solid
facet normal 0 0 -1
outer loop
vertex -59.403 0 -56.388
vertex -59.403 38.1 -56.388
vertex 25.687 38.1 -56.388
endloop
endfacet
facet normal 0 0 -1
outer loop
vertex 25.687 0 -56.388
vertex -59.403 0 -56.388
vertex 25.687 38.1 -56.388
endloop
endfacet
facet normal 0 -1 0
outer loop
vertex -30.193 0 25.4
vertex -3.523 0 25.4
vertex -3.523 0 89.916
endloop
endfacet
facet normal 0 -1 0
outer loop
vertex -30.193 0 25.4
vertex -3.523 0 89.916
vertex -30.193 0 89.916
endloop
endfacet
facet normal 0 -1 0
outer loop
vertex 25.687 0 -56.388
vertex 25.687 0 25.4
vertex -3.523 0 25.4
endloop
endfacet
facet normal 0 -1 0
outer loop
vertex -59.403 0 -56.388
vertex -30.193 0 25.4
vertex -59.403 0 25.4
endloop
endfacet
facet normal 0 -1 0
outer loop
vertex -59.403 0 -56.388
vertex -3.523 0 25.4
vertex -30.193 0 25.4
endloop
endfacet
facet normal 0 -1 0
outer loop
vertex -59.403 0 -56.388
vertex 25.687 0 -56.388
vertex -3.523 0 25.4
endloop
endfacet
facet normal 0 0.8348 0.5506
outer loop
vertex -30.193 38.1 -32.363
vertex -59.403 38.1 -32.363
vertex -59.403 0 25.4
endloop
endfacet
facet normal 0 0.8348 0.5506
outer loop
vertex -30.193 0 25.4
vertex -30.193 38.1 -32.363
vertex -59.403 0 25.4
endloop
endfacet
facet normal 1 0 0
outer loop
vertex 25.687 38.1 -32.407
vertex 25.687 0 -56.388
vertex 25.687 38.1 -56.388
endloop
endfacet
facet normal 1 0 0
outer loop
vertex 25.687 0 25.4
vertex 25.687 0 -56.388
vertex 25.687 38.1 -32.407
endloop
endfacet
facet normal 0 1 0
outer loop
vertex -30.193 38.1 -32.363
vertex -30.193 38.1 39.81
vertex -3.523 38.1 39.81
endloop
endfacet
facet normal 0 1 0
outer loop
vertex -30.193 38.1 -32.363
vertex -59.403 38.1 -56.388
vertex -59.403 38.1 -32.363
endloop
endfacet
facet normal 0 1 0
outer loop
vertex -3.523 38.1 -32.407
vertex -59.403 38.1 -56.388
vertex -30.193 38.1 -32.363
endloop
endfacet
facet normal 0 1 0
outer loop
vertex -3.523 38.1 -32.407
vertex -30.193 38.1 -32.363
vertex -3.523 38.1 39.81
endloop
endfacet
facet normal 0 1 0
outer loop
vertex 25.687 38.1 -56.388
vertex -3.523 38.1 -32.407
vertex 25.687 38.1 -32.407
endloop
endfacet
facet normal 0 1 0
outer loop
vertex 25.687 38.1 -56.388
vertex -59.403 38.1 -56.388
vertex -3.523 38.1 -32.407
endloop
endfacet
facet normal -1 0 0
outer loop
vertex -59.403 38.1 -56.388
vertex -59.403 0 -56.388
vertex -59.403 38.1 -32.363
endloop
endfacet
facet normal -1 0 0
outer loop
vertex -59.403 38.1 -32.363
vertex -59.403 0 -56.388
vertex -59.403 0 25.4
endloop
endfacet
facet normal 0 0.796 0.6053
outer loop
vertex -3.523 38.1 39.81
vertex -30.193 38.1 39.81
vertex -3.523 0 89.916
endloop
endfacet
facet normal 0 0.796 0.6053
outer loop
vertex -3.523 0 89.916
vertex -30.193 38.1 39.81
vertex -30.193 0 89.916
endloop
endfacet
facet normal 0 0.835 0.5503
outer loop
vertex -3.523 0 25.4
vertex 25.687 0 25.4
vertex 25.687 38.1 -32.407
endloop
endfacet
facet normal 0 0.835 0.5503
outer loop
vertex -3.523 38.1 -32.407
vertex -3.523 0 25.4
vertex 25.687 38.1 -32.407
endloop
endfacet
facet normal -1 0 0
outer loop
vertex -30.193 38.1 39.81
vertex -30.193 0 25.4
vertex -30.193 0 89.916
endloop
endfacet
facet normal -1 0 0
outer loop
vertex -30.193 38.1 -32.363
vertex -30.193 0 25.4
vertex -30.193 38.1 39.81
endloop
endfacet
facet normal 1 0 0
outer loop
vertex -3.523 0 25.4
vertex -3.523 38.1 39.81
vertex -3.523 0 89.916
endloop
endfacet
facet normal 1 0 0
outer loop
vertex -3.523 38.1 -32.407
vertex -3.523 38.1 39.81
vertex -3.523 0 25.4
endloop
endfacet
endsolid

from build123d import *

# Parameters (mm, degrees)
F0_W      = 44.45
F0_H      = 38.1
F1_DEPTH  = 25.4
F2_DEPTH  = 56.388
F3_DEPTH  = 85.09
F6_DEPTH  = 29.21
F7_DEPTH  = 29.21
F8_DEPTH  = 64.516
F10_DEPTH = 25.4
F11_DEPTH = 25.4


with BuildPart() as f1:
    # F0 (on Top) → F1 (new body)
    with BuildSketch(Plane.XY):
        with Locations((-37.1782257403, 19.05)):
            Rectangle(F0_W, F0_H)
    extrude(amount=F1_DEPTH)

    # F2 (add): a face of the model
    f2_faces = [f1.faces().sort_by_distance(p)[0] for p in [
        (-37.1782257403, 19.05, 0),
    ]]
    extrude(f2_faces, amount=F2_DEPTH)

    # F3 (add): a face of the model
    f3_faces = [f1.faces().sort_by_distance(p)[0] for p in [
        (-59.4032257403, 19.05, -15.494),
    ]]
    extrude(f3_faces, amount=-F3_DEPTH)

    # F5 (on face) → F6 (cut)
    with BuildSketch(Plane.YZ.offset(25.6867742597)):
        Polygon((0, 25.4), (38.1, -32.4071533978), (38.1, 25.4), align=None)
    extrude(amount=-F6_DEPTH, mode=Mode.SUBTRACT)

    # F4 (on face) → F7 (cut)
    with BuildSketch(Plane(origin=(-59.4032257403, 0, 0), x_dir=(0, -1, 0), z_dir=(-1, 0, 0))):
        Polygon((-38.1, 25.4), (-38.1, -32.3631092906), (0, 25.4), align=None)
    extrude(amount=-F7_DEPTH, mode=Mode.SUBTRACT)

    # F8 (add): a face of the model
    f8_faces = [f1.faces().sort_by_distance(p)[0] for p in [
        (-16.8582257403, 19.05, 25.4),
    ]]
    extrude(f8_faces, amount=F8_DEPTH)

    # F9 (on face) → F10 (cut)
    with BuildSketch(Plane(origin=(-30.1932257403, 0, 0), x_dir=(0, -1, 0), z_dir=(-1, 0, 0))):
        Polygon((-38.1, 89.916), (-38.1, 39.8104563355), (0, 89.916), align=None)
    extrude(amount=-F10_DEPTH, mode=Mode.SUBTRACT)

    # F11 (cut): a face of the model
    f11_faces = [f1.faces().sort_by_distance(p)[0] for p in [
        (-4.7932257403, 25.4, 73.2141521118),
    ]]
    extrude(f11_faces, amount=-F11_DEPTH, mode=Mode.SUBTRACT)


solid = f1.part
